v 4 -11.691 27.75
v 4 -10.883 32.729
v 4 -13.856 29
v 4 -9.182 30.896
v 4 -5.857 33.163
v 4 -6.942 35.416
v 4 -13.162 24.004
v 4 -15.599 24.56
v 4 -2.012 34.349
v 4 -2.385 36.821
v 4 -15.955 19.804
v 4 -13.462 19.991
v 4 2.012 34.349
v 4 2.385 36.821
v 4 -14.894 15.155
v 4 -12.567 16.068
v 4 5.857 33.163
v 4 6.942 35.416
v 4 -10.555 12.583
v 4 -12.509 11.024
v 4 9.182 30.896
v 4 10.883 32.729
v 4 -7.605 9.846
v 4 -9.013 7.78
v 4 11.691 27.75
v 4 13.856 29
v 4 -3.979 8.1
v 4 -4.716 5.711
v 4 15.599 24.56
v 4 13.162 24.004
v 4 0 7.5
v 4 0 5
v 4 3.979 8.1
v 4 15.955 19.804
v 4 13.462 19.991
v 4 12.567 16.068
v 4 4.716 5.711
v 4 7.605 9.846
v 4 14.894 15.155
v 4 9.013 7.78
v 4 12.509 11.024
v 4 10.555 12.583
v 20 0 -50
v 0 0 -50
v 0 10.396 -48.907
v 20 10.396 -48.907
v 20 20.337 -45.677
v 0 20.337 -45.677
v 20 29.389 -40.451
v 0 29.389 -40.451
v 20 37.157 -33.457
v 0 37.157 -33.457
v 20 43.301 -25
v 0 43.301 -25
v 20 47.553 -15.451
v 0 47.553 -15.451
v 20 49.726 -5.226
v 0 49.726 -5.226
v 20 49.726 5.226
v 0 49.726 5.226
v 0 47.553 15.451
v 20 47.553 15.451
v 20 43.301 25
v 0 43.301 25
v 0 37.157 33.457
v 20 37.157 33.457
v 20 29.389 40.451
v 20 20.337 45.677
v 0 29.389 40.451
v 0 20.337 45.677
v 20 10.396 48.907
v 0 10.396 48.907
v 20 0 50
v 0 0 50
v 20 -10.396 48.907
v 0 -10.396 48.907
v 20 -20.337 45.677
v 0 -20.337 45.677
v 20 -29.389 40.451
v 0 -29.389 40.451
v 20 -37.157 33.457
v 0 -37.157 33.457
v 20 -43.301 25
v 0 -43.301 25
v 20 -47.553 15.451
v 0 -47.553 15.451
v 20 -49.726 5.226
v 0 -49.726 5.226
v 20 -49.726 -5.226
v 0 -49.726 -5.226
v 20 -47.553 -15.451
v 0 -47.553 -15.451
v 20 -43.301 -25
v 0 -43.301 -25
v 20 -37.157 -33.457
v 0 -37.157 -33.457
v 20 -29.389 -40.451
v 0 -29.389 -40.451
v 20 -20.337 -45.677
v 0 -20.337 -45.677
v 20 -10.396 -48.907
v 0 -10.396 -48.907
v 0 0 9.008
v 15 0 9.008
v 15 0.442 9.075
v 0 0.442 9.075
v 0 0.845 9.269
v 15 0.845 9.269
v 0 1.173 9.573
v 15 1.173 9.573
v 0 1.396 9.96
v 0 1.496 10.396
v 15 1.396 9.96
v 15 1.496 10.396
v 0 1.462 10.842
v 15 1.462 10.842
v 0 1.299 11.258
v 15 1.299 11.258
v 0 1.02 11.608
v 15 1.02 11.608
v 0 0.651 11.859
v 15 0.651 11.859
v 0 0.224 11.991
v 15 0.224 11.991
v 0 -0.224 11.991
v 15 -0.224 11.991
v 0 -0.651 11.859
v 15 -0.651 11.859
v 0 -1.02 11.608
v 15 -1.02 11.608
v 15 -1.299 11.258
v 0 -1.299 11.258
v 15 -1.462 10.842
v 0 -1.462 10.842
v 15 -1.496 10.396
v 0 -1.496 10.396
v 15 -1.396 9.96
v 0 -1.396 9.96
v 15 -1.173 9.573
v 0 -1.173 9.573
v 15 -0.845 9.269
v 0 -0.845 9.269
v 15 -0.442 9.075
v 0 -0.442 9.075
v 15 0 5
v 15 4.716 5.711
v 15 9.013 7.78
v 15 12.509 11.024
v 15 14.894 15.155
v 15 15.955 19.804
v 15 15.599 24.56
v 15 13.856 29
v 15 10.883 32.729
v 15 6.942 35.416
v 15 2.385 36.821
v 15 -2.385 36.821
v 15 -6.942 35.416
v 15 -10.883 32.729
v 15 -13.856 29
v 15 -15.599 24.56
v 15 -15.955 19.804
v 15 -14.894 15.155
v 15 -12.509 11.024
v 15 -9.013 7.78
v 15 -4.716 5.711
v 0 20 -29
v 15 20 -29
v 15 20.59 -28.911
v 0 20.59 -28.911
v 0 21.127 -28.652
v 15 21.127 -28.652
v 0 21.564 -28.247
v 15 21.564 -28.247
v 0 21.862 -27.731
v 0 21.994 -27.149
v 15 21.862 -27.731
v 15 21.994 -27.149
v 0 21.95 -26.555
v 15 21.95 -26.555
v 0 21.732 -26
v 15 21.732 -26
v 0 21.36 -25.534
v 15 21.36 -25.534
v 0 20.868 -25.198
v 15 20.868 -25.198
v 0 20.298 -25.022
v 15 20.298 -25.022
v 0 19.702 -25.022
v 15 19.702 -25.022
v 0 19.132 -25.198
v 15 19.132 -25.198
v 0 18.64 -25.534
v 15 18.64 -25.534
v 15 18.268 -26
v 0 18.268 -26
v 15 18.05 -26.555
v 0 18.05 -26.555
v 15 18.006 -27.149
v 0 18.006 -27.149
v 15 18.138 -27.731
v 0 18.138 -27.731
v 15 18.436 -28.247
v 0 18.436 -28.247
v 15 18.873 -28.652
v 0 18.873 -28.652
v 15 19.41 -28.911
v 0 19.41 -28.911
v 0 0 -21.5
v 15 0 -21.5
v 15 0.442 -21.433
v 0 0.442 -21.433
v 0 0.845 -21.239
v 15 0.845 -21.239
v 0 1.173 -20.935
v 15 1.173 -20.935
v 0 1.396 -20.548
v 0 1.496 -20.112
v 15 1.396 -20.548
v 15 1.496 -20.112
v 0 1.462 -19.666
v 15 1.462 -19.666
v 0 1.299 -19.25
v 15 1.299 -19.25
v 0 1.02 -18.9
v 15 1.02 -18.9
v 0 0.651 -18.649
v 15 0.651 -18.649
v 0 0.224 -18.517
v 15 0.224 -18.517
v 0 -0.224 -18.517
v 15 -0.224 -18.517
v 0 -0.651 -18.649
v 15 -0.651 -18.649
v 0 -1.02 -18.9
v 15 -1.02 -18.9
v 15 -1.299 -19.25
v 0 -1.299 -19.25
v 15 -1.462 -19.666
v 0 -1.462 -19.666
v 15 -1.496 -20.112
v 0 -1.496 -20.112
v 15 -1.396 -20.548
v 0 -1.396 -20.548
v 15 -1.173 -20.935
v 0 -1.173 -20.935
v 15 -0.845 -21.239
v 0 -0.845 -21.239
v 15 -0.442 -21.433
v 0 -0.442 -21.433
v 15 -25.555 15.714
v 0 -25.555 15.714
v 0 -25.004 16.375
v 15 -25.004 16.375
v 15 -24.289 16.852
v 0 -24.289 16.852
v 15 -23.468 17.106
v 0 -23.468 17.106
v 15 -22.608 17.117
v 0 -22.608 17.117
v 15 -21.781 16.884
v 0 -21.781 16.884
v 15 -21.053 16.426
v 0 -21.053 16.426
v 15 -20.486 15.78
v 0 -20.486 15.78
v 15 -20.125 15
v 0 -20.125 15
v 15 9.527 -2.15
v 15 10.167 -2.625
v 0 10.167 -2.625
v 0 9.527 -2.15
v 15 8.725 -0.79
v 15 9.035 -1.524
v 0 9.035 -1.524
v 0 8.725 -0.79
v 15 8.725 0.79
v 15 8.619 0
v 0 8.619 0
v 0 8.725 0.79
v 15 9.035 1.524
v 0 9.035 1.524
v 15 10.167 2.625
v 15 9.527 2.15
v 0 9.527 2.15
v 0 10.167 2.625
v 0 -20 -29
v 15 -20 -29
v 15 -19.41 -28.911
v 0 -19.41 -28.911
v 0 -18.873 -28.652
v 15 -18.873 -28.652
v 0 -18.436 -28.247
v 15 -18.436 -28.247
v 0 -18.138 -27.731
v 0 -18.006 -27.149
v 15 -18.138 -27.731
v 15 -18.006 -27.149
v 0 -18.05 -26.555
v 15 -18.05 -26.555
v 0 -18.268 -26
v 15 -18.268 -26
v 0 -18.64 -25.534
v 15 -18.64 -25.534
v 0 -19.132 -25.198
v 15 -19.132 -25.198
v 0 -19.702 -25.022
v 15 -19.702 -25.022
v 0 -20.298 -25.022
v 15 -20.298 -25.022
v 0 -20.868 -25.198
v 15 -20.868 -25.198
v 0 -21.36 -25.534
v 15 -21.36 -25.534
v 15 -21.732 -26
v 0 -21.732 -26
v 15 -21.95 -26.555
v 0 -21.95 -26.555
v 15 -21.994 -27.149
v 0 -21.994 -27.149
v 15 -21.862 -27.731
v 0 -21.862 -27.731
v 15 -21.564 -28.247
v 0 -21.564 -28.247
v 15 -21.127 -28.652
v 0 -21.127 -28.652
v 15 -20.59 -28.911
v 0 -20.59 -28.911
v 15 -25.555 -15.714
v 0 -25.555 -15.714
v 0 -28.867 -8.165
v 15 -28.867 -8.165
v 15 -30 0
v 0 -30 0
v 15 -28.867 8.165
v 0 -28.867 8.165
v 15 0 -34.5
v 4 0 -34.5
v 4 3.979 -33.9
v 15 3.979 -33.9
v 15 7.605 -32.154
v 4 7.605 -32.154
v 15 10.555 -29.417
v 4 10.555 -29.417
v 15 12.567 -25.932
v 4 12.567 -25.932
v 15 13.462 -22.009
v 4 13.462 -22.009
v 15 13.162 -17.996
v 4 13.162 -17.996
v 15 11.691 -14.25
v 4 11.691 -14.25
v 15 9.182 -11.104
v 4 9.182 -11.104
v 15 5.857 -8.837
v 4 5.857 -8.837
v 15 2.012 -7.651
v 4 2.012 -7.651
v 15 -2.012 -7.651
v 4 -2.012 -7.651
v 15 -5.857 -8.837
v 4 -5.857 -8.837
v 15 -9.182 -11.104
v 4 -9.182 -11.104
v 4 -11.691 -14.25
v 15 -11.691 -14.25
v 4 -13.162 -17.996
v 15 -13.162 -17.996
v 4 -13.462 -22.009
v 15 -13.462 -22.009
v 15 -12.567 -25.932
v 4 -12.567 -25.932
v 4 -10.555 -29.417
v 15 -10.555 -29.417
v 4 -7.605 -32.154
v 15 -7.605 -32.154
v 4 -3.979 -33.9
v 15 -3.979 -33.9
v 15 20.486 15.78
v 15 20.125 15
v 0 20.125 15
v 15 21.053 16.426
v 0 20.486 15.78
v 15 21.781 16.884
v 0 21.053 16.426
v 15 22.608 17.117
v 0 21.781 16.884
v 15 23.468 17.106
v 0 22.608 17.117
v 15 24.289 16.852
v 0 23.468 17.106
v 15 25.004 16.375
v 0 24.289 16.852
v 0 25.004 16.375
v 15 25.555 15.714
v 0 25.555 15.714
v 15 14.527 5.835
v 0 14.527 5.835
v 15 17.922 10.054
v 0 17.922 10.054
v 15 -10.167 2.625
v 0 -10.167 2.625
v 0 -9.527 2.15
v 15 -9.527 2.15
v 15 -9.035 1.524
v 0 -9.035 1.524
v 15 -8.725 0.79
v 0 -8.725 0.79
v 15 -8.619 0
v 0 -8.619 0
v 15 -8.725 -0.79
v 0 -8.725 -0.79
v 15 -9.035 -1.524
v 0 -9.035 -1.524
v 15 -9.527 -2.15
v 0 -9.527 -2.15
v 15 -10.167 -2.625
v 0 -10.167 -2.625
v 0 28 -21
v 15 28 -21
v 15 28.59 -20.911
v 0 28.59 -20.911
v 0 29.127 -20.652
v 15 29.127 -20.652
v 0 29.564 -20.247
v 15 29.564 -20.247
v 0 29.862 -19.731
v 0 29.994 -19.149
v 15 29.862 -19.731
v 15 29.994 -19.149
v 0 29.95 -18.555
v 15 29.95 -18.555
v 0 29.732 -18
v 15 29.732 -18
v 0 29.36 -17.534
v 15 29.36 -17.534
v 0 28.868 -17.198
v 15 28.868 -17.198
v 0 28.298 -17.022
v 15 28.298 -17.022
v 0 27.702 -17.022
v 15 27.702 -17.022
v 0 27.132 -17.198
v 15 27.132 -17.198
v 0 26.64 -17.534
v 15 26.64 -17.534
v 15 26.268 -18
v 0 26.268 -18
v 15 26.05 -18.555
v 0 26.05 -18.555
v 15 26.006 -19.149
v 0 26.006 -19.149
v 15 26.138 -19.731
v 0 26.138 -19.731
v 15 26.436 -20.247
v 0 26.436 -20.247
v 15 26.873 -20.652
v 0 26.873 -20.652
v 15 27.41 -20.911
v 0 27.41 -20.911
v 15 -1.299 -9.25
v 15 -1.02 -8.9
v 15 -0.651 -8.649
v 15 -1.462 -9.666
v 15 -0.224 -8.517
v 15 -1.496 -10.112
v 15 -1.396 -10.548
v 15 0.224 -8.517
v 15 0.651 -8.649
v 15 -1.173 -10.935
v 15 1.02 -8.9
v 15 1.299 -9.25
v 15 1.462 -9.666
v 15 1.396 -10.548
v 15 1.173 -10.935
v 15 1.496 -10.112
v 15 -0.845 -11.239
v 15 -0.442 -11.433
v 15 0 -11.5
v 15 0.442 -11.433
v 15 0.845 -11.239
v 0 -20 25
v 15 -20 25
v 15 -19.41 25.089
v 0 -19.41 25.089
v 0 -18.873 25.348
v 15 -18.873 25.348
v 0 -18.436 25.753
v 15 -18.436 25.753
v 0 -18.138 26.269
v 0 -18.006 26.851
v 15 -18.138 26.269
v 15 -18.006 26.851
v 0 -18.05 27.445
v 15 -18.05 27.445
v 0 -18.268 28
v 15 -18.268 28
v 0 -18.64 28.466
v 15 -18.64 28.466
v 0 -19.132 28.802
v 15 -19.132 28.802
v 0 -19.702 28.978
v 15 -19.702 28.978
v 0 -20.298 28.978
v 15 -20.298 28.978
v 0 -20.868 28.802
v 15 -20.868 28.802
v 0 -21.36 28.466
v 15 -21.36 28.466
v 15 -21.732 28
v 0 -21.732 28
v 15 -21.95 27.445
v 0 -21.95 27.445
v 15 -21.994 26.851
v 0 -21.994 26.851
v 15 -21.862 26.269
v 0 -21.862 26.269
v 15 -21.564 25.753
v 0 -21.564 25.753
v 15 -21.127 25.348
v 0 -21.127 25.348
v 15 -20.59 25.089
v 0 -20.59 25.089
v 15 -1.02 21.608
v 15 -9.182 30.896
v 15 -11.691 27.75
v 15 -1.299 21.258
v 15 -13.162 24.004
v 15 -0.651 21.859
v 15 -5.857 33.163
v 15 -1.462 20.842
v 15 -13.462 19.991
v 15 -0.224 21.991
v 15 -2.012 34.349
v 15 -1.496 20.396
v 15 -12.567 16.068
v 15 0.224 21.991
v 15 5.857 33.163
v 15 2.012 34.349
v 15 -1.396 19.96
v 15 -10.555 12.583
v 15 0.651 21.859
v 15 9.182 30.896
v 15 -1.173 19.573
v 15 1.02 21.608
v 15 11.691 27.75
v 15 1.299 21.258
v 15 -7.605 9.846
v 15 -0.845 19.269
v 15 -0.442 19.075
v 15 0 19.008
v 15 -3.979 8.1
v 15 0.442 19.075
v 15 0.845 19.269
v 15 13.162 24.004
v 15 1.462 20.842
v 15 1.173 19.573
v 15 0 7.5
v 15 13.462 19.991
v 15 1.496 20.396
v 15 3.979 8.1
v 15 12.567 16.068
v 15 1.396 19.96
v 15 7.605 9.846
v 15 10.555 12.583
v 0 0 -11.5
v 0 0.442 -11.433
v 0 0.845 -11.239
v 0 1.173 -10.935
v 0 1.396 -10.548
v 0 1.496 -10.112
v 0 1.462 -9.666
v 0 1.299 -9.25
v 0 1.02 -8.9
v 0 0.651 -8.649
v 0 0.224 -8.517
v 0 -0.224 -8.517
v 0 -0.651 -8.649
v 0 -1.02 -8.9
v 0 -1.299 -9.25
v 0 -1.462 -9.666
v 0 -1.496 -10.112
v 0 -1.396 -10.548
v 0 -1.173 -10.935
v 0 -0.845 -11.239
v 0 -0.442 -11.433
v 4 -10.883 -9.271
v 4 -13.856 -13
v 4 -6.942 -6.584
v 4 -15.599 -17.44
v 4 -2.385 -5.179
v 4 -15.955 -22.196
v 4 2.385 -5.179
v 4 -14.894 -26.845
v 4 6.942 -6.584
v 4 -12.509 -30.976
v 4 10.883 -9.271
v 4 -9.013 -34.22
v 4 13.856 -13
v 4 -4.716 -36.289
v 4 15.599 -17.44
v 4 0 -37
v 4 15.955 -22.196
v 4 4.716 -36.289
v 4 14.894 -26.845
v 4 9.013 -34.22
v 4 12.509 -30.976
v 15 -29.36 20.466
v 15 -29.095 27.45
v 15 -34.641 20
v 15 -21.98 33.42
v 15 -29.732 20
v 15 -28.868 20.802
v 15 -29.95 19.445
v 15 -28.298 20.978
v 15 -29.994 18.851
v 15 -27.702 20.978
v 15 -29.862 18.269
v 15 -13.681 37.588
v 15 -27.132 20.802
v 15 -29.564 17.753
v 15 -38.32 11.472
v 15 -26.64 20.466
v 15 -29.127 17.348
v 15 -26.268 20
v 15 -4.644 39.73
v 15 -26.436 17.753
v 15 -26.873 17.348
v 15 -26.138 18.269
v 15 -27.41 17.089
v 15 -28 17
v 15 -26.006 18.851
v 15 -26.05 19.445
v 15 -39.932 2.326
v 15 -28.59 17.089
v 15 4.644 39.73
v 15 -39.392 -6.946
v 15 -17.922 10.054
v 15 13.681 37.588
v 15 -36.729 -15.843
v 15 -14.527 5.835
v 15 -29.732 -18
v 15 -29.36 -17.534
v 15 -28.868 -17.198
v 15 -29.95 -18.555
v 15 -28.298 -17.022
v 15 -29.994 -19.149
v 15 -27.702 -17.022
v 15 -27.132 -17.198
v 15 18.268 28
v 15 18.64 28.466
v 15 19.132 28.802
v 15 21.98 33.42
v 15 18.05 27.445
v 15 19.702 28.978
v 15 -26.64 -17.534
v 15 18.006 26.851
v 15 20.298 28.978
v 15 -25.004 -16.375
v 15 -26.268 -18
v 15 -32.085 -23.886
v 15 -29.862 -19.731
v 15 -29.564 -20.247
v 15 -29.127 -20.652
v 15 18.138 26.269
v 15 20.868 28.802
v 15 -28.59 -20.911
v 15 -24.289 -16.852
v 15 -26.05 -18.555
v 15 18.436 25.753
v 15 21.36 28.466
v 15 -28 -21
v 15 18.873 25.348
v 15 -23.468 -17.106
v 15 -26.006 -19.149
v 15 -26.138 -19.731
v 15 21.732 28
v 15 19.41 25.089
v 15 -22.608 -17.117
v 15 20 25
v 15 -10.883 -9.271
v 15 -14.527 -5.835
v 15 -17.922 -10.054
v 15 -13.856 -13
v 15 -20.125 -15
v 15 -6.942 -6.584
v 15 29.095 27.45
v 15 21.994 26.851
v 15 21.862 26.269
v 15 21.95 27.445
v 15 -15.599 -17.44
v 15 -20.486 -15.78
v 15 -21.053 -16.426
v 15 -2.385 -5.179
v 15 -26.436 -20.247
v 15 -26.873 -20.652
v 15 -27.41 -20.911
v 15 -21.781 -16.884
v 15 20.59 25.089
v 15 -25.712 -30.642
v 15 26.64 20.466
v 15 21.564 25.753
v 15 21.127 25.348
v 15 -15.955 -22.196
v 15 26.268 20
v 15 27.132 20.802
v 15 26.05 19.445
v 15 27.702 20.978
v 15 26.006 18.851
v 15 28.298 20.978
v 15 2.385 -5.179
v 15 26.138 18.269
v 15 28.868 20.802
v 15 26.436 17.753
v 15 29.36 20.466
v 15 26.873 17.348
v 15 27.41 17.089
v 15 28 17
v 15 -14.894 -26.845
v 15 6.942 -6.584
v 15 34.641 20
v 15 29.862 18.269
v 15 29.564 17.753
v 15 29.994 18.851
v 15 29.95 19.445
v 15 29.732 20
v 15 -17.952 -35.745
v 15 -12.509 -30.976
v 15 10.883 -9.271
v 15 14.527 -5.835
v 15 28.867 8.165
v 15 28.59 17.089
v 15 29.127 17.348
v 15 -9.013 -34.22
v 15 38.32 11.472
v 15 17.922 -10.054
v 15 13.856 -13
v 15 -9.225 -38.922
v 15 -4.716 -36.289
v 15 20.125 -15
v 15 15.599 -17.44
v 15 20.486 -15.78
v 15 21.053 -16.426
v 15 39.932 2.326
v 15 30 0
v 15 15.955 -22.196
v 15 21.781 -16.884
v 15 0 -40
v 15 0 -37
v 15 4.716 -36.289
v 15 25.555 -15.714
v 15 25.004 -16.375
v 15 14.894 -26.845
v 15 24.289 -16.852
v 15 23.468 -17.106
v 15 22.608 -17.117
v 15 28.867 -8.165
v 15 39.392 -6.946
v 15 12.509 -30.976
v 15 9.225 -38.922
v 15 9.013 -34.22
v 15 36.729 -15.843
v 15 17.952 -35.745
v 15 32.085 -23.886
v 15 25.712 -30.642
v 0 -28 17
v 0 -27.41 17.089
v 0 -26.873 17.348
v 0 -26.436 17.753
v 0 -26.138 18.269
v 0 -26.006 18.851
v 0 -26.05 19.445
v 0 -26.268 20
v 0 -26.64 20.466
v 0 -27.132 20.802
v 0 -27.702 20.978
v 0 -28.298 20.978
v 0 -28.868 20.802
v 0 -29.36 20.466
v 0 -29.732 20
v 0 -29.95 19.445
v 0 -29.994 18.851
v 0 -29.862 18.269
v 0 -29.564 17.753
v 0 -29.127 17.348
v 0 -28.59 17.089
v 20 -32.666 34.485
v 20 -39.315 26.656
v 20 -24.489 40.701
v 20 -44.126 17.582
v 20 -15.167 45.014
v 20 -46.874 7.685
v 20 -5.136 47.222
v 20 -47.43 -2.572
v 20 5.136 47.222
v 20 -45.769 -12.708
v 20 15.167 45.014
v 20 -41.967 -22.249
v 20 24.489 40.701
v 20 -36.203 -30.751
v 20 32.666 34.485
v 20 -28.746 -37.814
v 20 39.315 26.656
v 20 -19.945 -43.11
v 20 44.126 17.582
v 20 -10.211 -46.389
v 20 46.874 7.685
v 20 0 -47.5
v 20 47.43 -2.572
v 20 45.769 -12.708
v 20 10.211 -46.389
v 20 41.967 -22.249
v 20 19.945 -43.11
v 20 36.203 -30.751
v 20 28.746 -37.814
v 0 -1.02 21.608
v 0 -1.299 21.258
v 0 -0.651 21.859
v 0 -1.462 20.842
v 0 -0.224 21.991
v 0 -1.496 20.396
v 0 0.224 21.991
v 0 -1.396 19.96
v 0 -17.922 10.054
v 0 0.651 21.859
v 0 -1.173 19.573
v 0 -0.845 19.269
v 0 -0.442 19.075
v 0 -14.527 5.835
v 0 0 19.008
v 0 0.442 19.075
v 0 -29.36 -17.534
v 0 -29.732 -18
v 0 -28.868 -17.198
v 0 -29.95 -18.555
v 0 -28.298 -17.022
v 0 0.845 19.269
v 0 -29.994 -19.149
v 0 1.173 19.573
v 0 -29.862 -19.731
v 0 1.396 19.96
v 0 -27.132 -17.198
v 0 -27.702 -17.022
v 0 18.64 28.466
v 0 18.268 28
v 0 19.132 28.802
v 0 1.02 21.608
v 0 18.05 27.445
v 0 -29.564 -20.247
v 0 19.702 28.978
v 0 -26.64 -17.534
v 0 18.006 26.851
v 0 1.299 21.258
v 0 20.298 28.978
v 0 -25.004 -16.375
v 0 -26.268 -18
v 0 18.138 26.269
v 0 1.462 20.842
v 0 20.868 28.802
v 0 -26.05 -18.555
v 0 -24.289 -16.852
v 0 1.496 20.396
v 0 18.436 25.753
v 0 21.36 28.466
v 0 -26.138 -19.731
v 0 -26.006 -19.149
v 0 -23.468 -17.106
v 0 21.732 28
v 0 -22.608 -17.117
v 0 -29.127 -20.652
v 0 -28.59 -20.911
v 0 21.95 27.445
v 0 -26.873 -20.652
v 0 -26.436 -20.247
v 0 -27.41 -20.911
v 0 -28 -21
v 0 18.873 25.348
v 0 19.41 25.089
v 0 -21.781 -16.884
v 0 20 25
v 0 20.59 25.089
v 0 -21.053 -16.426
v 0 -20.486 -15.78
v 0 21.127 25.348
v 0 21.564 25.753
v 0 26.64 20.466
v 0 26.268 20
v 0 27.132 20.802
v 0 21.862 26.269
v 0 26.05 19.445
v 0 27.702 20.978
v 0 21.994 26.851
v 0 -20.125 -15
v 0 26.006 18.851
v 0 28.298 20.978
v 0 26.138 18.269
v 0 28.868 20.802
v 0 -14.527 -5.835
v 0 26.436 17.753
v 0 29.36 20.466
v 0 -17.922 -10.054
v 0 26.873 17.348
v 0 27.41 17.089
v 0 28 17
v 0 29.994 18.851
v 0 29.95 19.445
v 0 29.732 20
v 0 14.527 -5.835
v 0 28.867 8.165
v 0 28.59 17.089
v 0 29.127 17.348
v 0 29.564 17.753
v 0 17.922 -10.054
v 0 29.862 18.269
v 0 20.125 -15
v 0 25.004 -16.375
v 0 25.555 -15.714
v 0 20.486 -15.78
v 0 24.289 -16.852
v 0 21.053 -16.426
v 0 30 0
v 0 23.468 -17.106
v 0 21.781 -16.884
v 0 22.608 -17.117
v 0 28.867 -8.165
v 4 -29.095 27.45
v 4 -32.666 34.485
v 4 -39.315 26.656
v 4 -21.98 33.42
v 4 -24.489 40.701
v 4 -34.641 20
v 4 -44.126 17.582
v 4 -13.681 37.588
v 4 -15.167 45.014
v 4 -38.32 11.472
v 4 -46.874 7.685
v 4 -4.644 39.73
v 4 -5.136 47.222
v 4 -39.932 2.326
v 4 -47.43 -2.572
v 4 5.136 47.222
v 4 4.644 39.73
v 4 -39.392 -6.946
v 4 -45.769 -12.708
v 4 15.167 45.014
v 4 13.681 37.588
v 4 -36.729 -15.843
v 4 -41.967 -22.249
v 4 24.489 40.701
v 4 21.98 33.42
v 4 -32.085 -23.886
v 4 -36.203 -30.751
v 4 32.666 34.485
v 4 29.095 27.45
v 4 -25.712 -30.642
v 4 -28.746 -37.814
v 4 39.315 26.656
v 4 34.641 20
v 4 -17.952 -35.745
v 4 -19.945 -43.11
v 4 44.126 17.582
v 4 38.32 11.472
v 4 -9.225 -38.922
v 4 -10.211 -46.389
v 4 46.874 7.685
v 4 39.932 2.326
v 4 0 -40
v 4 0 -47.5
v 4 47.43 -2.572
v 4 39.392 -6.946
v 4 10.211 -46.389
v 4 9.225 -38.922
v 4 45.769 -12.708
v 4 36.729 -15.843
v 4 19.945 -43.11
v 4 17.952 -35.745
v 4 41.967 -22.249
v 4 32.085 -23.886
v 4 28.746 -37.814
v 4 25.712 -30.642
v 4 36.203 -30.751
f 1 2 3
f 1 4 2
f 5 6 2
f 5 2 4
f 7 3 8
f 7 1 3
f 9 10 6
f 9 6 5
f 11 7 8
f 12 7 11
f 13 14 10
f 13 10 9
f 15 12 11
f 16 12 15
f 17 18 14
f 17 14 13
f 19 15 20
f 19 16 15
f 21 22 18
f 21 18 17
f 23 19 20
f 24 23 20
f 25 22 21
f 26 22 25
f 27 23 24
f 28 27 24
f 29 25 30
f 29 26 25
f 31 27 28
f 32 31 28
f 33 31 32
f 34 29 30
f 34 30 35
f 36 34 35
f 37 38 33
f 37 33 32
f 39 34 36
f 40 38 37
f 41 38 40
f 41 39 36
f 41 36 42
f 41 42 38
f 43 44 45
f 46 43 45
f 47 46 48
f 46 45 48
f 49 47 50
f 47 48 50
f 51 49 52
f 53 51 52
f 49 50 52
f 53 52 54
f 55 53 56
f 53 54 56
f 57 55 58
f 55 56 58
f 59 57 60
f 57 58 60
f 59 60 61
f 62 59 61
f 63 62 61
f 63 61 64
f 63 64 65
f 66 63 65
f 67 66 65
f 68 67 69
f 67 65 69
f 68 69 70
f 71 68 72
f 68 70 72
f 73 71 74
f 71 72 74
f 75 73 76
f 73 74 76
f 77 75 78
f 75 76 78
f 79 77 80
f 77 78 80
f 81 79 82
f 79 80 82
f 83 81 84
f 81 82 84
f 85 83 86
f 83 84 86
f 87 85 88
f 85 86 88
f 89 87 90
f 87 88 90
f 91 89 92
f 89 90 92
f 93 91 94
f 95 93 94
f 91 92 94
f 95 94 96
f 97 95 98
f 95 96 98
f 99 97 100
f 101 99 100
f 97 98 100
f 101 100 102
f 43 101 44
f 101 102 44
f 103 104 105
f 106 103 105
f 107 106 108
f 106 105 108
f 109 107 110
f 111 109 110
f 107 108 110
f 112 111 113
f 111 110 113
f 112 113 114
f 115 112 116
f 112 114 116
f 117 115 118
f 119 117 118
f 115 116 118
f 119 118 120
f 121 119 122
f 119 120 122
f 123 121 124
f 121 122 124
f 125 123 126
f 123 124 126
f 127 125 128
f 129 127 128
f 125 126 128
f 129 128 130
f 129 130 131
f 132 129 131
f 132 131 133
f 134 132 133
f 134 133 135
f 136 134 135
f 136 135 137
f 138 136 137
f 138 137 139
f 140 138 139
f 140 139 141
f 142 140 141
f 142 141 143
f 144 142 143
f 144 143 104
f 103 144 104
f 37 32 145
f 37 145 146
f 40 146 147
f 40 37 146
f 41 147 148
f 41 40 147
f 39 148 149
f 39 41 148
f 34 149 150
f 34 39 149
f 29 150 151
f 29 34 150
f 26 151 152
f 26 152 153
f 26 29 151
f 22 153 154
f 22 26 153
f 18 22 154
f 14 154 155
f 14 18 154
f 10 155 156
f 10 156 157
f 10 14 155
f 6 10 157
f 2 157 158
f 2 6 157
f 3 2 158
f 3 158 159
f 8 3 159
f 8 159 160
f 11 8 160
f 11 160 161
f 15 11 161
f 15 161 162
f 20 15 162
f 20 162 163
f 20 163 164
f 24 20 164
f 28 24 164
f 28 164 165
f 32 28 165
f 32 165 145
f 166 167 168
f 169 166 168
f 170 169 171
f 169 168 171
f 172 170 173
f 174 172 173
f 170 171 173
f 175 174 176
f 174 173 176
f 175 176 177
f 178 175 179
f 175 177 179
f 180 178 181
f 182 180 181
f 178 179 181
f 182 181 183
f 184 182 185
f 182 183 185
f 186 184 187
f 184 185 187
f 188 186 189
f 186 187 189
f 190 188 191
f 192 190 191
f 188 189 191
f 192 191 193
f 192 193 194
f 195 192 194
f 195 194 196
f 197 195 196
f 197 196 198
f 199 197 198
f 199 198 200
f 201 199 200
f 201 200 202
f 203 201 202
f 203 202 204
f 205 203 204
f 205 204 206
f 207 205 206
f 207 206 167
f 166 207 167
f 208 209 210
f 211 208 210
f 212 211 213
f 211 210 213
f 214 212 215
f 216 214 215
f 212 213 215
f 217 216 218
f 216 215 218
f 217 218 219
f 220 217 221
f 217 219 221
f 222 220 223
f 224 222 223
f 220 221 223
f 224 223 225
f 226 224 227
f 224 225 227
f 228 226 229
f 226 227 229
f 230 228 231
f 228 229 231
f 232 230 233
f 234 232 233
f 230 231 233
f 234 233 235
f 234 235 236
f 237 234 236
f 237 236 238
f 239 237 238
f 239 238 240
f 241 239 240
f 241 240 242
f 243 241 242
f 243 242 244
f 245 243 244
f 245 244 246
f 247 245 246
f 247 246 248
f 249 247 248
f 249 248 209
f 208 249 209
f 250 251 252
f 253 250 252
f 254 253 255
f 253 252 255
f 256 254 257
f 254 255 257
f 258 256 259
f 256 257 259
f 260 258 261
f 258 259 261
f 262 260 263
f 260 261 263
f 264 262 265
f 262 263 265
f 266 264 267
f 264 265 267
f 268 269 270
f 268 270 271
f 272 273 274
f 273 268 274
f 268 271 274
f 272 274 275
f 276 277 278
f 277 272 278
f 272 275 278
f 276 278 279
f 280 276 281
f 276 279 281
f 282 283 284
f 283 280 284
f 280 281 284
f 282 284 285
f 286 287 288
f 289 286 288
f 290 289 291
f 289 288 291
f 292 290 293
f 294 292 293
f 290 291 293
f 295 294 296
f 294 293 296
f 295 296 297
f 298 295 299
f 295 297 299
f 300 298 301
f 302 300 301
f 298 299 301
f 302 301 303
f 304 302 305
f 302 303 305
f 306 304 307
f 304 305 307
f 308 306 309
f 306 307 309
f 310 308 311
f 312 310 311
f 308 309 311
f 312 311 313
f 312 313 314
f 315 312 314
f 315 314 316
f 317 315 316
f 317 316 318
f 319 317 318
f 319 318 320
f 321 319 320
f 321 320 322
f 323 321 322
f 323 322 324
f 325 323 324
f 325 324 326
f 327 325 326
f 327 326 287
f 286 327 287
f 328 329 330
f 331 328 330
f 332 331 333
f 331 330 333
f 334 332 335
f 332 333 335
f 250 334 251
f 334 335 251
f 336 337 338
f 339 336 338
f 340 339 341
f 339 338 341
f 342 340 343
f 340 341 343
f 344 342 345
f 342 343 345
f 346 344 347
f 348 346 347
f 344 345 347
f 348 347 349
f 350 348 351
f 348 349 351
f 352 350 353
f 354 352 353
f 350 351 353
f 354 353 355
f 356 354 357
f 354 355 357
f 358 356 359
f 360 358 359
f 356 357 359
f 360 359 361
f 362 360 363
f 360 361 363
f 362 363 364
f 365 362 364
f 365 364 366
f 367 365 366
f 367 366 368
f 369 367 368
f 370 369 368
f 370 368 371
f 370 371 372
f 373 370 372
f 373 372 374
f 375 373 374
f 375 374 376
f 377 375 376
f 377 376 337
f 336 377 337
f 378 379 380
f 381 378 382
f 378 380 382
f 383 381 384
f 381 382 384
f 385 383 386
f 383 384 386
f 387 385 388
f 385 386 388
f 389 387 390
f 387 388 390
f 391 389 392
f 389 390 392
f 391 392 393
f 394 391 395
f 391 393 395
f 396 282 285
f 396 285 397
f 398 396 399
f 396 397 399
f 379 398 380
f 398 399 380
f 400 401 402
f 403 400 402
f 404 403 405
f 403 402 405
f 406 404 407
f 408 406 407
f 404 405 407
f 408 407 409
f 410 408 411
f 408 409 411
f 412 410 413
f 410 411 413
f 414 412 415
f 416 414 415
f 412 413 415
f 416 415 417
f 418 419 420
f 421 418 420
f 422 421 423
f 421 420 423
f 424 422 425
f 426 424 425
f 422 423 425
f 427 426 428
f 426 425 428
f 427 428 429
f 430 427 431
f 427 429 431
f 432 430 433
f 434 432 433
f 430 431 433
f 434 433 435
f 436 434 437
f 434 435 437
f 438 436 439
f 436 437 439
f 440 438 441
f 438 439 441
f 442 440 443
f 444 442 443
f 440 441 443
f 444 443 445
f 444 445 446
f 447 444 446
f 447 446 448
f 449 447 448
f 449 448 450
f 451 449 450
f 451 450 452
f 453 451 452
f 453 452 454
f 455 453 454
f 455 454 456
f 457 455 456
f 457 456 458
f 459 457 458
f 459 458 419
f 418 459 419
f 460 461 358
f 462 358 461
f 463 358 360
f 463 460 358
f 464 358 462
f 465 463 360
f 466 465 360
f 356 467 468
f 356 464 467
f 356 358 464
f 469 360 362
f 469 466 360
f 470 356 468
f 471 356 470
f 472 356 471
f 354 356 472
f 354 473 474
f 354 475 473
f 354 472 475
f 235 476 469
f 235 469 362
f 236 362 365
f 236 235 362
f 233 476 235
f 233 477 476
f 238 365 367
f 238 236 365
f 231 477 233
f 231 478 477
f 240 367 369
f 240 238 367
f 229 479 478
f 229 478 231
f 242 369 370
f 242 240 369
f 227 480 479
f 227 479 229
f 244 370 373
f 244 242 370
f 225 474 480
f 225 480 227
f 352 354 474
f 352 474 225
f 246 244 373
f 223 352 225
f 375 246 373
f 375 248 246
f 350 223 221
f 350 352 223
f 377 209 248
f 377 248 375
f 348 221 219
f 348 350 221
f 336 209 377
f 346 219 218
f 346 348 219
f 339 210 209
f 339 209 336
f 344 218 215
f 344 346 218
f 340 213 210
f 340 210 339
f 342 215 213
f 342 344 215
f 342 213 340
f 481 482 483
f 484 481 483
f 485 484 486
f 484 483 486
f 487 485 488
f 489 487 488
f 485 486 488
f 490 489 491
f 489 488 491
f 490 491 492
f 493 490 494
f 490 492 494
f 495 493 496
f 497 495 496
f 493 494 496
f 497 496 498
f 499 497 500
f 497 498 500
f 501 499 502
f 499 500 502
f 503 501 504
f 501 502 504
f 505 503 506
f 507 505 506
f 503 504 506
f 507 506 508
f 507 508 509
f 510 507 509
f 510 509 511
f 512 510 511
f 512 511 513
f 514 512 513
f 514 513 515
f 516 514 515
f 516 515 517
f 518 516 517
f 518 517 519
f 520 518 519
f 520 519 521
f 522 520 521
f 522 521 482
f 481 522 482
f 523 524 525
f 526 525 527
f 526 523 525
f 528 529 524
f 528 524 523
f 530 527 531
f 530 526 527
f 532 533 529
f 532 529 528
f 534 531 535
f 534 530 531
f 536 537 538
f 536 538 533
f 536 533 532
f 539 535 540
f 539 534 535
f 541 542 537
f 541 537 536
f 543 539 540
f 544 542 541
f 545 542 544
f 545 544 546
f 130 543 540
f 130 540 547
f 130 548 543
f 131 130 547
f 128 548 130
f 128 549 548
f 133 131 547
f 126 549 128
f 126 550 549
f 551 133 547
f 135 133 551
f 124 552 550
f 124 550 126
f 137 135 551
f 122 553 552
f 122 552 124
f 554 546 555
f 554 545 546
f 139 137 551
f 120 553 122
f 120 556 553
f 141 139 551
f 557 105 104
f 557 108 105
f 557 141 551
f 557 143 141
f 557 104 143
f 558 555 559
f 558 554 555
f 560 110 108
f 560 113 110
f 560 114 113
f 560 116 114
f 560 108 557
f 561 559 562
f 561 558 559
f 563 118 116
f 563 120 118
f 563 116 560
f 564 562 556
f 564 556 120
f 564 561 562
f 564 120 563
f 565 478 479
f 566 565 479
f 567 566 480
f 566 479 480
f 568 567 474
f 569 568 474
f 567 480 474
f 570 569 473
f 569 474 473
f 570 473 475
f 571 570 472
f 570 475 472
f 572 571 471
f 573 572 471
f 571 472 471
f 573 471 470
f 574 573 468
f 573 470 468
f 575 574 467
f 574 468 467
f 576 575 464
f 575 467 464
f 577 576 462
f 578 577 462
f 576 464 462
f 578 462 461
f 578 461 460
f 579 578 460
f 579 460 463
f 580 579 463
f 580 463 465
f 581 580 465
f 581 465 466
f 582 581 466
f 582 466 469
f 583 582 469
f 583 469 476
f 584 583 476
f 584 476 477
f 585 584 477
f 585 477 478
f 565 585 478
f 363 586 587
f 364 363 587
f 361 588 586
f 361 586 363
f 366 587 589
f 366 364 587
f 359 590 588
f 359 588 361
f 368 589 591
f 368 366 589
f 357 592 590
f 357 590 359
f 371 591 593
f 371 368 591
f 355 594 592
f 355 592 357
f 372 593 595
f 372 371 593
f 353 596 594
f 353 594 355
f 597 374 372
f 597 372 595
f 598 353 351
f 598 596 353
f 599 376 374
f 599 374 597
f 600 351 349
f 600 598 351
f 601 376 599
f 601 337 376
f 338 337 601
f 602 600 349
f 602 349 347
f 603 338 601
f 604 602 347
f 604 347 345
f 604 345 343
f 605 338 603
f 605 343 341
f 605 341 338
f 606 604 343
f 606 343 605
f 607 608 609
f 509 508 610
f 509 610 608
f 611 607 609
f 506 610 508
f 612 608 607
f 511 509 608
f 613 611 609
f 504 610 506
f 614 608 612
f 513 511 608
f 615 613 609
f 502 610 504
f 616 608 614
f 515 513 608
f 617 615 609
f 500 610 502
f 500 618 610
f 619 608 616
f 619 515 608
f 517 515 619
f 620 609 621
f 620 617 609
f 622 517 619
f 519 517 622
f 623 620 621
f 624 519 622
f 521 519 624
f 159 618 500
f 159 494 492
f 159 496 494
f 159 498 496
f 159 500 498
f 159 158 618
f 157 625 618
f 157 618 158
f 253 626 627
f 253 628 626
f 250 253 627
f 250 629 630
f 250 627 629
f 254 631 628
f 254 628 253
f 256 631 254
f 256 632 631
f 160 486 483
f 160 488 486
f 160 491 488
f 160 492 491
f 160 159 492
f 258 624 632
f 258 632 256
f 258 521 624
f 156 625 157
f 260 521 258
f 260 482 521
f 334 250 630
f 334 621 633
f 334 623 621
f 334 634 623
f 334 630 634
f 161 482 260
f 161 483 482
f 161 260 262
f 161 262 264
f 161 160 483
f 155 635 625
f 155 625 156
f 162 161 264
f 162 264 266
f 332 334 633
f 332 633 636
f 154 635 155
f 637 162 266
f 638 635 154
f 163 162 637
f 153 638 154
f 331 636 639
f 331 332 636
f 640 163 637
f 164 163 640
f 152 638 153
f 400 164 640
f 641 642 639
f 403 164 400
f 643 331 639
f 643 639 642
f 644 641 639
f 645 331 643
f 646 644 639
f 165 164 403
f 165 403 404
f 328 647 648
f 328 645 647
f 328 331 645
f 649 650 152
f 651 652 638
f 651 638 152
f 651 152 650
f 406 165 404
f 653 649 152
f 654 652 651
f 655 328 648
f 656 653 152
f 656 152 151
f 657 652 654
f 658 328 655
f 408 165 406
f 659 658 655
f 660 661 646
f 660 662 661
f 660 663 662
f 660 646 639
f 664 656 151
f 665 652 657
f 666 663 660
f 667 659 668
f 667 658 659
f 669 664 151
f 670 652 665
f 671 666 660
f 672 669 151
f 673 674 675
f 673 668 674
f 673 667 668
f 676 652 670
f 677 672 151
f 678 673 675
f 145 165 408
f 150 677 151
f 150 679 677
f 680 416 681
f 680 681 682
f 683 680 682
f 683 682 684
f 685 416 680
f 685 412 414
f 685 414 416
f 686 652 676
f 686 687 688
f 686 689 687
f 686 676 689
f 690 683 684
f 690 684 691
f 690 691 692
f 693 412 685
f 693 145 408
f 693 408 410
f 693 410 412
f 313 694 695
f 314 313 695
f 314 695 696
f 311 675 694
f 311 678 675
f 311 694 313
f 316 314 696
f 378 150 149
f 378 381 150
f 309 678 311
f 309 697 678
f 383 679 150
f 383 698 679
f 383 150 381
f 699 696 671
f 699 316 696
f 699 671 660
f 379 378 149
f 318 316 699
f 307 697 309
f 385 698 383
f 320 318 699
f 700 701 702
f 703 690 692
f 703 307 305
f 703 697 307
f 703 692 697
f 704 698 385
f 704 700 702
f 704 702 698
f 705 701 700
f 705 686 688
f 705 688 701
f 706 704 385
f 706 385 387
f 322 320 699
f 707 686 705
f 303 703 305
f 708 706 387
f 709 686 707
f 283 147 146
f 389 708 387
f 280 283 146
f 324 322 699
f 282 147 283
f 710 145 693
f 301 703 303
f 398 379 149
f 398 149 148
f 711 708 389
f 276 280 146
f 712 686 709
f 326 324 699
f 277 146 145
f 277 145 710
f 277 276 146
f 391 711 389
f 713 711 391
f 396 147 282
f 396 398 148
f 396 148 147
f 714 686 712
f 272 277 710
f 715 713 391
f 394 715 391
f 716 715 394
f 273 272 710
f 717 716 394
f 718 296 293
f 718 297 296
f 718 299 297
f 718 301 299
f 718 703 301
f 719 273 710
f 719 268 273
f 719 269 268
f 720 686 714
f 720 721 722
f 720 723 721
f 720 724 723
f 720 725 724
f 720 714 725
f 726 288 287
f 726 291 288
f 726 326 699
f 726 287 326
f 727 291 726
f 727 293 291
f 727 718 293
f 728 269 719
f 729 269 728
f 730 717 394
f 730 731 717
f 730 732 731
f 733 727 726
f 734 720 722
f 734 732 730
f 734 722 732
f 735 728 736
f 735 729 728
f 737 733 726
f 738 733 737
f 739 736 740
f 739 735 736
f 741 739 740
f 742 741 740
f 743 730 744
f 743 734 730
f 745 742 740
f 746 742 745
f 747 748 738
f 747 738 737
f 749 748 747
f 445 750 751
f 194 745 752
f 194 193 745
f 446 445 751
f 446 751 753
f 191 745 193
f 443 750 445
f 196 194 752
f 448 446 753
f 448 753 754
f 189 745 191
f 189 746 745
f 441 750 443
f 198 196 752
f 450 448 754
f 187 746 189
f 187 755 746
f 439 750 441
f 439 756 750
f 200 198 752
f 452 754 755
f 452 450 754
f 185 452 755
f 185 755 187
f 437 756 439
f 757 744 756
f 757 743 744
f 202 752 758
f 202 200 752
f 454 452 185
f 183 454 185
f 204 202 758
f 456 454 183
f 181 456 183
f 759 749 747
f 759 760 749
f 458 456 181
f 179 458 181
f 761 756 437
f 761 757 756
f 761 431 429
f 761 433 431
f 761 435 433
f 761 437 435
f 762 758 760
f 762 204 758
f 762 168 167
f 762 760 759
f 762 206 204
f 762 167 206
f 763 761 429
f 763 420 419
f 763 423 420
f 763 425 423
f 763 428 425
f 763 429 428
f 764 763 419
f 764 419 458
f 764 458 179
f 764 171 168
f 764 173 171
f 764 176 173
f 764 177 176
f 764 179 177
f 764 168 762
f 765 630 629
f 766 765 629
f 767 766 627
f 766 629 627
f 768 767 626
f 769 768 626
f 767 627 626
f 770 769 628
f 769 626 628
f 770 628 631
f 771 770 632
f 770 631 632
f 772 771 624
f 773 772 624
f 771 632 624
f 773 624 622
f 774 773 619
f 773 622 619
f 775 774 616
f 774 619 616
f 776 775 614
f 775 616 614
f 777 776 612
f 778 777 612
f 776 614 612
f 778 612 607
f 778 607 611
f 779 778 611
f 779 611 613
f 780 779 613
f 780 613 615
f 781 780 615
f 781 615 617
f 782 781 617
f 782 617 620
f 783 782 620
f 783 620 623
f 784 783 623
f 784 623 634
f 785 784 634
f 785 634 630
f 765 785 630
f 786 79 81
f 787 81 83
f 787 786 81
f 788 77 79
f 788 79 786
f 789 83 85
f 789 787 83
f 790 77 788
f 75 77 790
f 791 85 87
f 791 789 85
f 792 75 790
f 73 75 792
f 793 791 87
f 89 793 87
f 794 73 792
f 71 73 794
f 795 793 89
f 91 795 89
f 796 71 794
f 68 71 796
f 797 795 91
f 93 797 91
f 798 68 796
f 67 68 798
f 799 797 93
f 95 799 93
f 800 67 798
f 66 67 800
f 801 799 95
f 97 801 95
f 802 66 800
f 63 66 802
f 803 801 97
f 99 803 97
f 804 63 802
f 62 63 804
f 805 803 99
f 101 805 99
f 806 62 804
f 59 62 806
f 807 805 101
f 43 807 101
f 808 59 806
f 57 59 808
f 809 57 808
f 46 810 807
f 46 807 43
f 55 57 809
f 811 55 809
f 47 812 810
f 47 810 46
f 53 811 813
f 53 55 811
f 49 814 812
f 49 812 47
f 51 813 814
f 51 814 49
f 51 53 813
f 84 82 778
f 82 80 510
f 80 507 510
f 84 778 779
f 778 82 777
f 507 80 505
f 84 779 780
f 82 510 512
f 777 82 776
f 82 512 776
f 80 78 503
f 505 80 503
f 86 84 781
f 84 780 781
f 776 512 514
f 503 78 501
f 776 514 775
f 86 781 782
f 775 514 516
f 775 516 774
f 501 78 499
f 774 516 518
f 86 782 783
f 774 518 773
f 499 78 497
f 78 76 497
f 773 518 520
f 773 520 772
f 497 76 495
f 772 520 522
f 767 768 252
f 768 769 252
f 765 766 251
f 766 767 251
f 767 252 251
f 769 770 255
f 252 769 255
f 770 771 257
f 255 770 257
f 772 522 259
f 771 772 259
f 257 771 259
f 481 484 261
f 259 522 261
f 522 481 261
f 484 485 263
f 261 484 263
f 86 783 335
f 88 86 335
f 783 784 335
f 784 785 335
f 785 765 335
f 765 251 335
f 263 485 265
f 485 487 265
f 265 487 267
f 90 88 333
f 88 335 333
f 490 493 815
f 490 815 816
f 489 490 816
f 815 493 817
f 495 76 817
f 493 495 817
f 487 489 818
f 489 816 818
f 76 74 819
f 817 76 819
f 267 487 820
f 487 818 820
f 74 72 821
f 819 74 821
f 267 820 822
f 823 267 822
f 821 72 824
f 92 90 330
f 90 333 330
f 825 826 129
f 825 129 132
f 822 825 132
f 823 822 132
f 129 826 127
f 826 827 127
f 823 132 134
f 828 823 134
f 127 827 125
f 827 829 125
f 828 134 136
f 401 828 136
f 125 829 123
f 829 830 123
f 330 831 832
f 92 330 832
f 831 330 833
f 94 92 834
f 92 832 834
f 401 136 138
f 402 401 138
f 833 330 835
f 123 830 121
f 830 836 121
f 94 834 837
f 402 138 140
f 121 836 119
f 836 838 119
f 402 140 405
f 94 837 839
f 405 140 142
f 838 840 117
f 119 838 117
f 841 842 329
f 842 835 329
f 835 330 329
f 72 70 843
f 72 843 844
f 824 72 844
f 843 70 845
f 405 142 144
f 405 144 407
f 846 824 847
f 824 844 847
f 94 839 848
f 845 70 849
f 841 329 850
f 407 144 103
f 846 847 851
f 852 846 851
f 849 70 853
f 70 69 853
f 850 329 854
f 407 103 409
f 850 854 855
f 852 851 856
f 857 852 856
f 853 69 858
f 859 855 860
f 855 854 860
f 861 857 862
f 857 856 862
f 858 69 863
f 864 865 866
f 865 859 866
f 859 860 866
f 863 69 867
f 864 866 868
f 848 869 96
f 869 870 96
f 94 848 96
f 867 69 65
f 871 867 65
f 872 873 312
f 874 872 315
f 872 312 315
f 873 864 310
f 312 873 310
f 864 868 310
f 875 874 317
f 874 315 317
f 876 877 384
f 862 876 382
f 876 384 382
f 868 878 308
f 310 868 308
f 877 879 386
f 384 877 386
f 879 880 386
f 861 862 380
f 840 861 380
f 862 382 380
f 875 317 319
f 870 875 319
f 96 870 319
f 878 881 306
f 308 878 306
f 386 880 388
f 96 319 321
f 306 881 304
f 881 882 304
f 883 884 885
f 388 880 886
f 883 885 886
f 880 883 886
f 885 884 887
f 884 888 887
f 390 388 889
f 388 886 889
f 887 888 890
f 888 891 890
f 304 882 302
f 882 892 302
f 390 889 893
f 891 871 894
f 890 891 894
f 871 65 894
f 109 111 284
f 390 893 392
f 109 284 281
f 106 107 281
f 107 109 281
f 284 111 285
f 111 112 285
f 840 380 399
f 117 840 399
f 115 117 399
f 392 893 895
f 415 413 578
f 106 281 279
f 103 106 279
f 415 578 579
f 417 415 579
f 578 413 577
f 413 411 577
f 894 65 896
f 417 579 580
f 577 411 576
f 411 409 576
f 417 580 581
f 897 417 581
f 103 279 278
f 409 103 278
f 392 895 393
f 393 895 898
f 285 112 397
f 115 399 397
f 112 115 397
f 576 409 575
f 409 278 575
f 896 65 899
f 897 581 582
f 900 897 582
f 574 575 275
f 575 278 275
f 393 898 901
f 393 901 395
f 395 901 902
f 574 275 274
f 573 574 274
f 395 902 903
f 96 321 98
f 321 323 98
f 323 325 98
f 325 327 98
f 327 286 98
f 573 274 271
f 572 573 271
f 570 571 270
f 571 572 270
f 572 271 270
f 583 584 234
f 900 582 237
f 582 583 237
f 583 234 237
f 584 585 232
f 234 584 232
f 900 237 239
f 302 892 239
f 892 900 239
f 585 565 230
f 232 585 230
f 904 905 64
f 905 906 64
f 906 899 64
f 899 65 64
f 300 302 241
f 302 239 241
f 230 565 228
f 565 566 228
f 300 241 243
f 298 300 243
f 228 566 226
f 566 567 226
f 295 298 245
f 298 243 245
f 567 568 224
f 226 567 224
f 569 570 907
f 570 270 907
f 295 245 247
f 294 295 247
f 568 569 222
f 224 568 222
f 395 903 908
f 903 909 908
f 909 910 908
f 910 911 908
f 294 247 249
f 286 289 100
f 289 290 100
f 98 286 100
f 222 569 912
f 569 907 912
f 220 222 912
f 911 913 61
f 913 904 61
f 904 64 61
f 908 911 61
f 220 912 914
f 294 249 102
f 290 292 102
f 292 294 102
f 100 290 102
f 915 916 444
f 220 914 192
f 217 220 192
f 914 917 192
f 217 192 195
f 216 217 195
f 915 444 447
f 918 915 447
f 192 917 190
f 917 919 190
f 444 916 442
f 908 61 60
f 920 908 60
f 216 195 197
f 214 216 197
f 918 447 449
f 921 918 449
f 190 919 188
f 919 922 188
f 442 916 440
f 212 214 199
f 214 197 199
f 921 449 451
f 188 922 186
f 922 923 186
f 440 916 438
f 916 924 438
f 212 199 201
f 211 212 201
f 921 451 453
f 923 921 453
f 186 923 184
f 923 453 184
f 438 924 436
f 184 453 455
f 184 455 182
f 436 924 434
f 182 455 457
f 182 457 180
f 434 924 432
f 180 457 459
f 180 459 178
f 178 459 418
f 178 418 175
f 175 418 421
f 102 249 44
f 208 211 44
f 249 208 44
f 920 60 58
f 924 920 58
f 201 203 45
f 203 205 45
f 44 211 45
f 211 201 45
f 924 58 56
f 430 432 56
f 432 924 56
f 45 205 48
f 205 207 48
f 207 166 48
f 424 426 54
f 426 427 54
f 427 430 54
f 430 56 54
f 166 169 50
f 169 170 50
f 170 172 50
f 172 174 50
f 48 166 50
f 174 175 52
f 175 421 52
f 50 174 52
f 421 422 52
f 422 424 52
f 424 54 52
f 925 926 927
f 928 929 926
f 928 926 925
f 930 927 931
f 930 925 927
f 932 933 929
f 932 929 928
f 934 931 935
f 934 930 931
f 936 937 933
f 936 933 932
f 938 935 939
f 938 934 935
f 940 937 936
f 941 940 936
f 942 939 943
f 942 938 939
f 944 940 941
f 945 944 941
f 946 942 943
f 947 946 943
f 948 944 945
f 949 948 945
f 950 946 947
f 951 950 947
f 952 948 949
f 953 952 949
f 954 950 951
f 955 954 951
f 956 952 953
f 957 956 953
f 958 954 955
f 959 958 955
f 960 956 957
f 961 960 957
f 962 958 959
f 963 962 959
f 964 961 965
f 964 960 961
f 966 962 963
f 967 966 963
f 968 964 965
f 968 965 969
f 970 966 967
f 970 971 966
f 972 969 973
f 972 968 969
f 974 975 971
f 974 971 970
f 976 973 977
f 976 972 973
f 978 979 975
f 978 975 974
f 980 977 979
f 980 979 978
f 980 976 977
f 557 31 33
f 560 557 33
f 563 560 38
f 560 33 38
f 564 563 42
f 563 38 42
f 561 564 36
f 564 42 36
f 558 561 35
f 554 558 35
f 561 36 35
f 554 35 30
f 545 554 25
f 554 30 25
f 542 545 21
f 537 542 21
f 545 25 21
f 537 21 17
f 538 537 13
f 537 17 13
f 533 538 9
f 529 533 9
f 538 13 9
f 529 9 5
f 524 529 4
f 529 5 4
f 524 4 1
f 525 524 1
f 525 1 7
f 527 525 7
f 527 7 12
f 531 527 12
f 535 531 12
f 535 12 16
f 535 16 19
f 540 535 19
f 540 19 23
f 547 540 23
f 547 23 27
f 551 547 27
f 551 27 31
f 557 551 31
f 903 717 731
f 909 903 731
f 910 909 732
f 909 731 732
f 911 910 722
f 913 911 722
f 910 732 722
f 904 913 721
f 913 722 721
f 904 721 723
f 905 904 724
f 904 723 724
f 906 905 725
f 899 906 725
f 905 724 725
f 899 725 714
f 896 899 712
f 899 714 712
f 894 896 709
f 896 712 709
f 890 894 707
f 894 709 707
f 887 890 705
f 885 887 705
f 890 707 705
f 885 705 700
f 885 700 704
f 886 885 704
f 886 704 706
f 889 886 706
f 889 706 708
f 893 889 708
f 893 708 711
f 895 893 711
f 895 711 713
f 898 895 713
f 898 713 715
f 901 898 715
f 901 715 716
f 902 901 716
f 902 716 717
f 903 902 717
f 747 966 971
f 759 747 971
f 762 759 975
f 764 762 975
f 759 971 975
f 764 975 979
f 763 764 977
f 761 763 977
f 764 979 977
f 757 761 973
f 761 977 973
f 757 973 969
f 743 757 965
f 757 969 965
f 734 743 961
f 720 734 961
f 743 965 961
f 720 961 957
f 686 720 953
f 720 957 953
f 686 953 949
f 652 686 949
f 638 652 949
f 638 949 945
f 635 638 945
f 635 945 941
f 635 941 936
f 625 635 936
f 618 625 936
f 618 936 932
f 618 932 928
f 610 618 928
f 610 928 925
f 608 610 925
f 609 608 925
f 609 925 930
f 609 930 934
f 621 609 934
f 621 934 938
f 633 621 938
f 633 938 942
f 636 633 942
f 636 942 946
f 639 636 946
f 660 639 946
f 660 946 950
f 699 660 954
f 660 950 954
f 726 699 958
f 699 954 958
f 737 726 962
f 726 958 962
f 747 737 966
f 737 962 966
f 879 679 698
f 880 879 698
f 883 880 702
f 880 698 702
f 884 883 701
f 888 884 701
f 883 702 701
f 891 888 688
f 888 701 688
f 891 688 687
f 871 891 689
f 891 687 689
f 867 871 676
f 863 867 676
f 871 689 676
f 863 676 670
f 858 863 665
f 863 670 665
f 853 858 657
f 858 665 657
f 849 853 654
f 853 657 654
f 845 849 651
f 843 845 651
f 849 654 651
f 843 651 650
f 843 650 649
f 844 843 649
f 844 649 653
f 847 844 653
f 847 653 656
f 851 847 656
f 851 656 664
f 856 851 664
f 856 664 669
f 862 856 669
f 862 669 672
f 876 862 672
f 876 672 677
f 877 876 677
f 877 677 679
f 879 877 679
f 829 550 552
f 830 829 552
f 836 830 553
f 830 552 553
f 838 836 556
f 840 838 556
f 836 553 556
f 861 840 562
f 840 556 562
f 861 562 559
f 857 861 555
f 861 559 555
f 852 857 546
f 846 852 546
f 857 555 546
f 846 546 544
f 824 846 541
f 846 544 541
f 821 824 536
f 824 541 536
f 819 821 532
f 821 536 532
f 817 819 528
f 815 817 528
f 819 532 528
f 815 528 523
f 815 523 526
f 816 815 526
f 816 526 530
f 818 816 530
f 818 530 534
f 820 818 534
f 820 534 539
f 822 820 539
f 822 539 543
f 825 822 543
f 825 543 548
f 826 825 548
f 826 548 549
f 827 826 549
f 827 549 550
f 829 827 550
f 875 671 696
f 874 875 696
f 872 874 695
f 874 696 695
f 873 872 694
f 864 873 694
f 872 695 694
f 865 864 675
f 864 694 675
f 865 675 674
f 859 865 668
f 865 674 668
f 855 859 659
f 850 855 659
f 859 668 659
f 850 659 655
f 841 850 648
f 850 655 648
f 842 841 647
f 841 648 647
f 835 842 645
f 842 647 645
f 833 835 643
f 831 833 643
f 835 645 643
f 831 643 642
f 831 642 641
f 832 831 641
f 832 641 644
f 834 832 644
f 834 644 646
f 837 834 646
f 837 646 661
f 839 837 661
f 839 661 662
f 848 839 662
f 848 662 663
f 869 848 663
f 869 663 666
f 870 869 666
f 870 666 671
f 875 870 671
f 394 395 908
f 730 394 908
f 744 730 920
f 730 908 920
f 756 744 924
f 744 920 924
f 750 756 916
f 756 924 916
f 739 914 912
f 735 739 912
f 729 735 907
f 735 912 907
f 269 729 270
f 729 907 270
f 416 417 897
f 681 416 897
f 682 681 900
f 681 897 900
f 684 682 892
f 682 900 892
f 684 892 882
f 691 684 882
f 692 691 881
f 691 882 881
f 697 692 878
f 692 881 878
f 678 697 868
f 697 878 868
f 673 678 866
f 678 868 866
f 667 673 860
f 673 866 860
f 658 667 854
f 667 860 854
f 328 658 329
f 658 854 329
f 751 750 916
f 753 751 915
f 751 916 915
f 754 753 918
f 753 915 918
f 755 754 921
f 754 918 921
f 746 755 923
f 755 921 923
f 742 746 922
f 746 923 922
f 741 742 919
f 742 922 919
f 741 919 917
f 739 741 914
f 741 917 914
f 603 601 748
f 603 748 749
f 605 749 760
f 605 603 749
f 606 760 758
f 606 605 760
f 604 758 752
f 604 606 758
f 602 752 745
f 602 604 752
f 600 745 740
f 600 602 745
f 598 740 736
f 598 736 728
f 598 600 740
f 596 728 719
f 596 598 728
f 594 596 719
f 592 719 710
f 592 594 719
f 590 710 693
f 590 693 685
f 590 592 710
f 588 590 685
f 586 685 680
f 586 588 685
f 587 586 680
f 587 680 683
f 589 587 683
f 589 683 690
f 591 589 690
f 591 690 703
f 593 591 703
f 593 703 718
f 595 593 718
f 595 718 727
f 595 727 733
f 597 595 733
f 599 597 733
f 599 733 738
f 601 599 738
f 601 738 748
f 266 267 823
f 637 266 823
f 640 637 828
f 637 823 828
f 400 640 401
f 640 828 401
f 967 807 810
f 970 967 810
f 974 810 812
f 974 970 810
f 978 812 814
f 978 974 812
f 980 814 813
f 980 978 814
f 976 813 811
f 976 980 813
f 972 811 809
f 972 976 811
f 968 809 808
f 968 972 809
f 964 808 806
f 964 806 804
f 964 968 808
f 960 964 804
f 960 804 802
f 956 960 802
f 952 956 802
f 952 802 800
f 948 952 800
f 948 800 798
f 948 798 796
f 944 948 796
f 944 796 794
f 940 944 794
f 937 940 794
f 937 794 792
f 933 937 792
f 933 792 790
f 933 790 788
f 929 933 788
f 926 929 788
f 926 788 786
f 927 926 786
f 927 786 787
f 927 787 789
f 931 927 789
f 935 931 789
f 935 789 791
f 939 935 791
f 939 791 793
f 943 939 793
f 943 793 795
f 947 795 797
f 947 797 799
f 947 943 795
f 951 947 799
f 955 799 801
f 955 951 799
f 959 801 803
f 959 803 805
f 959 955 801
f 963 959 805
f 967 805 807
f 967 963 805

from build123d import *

# Parameters (mm, degrees)
SKETCH1_R           = 50
SKETCH1_R_2         = 47.5
BOSS_EXTRUDE1_DEPTH = 20
SKETCH1_3_R         = 50
BOSS_EXTRUDE2_DEPTH = 4
SKETCH1_4_R         = 40
SKETCH1_4_R_2       = 16
SKETCH1_4_R_3       = 13.5
BOSS_EXTRUDE3_DEPTH = 15
SKETCH2_R           = 2
SKETCH2_R_2         = 1.5
CUT_EXTRUDE1_DEPTH  = 73.284161474


with BuildPart() as part:
    # Sketch1 → Boss-Extrude1 (new body)
    with BuildSketch(Plane(origin=(0, 0, 0), x_dir=(0, 0, -1), z_dir=(1, 0, 0))):
        Circle(SKETCH1_R)
        Circle(SKETCH1_R_2, mode=Mode.SUBTRACT)
    extrude(amount=BOSS_EXTRUDE1_DEPTH)

    # Sketch1<3> → Boss-Extrude2 (add)
    with BuildSketch(Plane(origin=(0, 0, 0), x_dir=(0, 0, -1), z_dir=(1, 0, 0))):
        Circle(SKETCH1_3_R)
        with BuildLine():
            ThreePointArc((15.714285714, 25.5550626), (17.117237545, 22.608325942), (15, 20.124611797))
            ThreePointArc((15, 20.124611797), (7.83467626, 16.36075337), (2.625, 10.166581284))
            ThreePointArc((2.625, 10.166581284), (0, 8.618950039), (-2.625, 10.166581284))
            ThreePointArc((-2.625, 10.166581284), (-7.83467626, 16.36075337), (-15, 20.124611797))
            ThreePointArc((-15, 20.124611797), (-17.117237545, 22.608325942), (-15.714285714, 25.5550626))
            ThreePointArc((-15.714285714, 25.5550626), (0, 30), (15.714285714, 25.5550626))
        make_face(mode=Mode.SUBTRACT)
        with BuildLine():
            ThreePointArc((-15.714285714, -25.5550626), (-17.117237545, -22.608325942), (-15, -20.124611797))
            ThreePointArc((-15, -20.124611797), (-7.83467626, -16.36075337), (-2.625, -10.166581284))
            ThreePointArc((-2.625, -10.166581284), (0, -8.618950039), (2.625, -10.166581284))
            ThreePointArc((2.625, -10.166581284), (7.83467626, -16.36075337), (15, -20.124611797))
            ThreePointArc((15, -20.124611797), (17.117237545, -22.608325942), (15.714285714, -25.5550626))
            ThreePointArc((15.714285714, -25.5550626), (0, -30), (-15.714285714, -25.5550626))
        make_face(mode=Mode.SUBTRACT)
    extrude(amount=BOSS_EXTRUDE2_DEPTH)

    # Sketch1<4> → Boss-Extrude3 (add)
    # profile 1 of 3: a face of its own
    with BuildSketch(Plane(origin=(0, 0, 0), x_dir=(0, 0, -1), z_dir=(1, 0, 0))):
        Circle(SKETCH1_4_R)
        with BuildLine():
            ThreePointArc((-15.714285714, -25.5550626), (-17.117237545, -22.608325942), (-15, -20.124611797))
            ThreePointArc((-15, -20.124611797), (-7.83467626, -16.36075337), (-2.625, -10.166581284))
            ThreePointArc((-2.625, -10.166581284), (0, -8.618950039), (2.625, -10.166581284))
            ThreePointArc((2.625, -10.166581284), (7.83467626, -16.36075337), (15, -20.124611797))
            ThreePointArc((15, -20.124611797), (17.117237545, -22.608325942), (15.714285714, -25.5550626))
            ThreePointArc((15.714285714, -25.5550626), (0, -30), (-15.714285714, -25.5550626))
        make_face(mode=Mode.SUBTRACT)
        with Locations((-21, 0)):
            Circle(SKETCH1_4_R_2, mode=Mode.SUBTRACT)
        with Locations((21, 0)):
            Circle(SKETCH1_4_R_2, mode=Mode.SUBTRACT)
        with BuildLine():
            ThreePointArc((-15.714285714, 25.5550626), (0, 30), (15.714285714, 25.5550626))
            ThreePointArc((15.714285714, 25.5550626), (17.117237545, 22.608325942), (15, 20.124611797))
            ThreePointArc((15, 20.124611797), (7.83467626, 16.36075337), (2.625, 10.166581284))
            ThreePointArc((2.625, 10.166581284), (0, 8.618950039), (-2.625, 10.166581284))
            ThreePointArc((-2.625, 10.166581284), (-7.83467626, 16.36075337), (-15, 20.124611797))
            ThreePointArc((-15, 20.124611797), (-17.117237545, 22.608325942), (-15.714285714, 25.5550626))
        make_face(mode=Mode.SUBTRACT)
    # profile 2 of 3: a face of its own
    with BuildSketch(Plane(origin=(0, 0, 0), x_dir=(0, 0, -1), z_dir=(1, 0, 0))):
        with Locations((-21, 0)):
            Circle(SKETCH1_4_R_3)
    # profile 3 of 3: a face of its own
    with BuildSketch(Plane(origin=(0, 0, 0), x_dir=(0, 0, -1), z_dir=(1, 0, 0))):
        with Locations((21, 0)):
            Circle(SKETCH1_4_R_3)
    extrude(amount=BOSS_EXTRUDE3_DEPTH)

    # Sketch2 → Cut-Extrude1 (cut, through all)
    with BuildSketch(Plane(origin=(15, 0, 0), x_dir=(0, 0, -1), z_dir=(1, 0, 0))):
        with Locations((-27, -20)):
            Circle(SKETCH2_R)
        with Locations((-19, -28)):
            Circle(SKETCH2_R)
        with Locations((-20.508, 0)):
            Circle(SKETCH2_R_2)
        with Locations((-10.508, 0)):
            Circle(SKETCH2_R_2)
        with Locations((10, 0)):
            Circle(SKETCH2_R_2)
        with Locations((20, 0)):
            Circle(SKETCH2_R_2)
        with Locations((19, -28)):
            Circle(SKETCH2_R)
        with Locations((27, -20)):
            Circle(SKETCH2_R)
        with Locations((27, 20)):
            Circle(SKETCH2_R)
        with Locations((19, 28)):
            Circle(SKETCH2_R)
        with Locations((-19, 28)):
            Circle(SKETCH2_R)
        with Locations((-27, 20)):
            Circle(SKETCH2_R)
    extrude(amount=-CUT_EXTRUDE1_DEPTH, mode=Mode.SUBTRACT)


solid = part.part
